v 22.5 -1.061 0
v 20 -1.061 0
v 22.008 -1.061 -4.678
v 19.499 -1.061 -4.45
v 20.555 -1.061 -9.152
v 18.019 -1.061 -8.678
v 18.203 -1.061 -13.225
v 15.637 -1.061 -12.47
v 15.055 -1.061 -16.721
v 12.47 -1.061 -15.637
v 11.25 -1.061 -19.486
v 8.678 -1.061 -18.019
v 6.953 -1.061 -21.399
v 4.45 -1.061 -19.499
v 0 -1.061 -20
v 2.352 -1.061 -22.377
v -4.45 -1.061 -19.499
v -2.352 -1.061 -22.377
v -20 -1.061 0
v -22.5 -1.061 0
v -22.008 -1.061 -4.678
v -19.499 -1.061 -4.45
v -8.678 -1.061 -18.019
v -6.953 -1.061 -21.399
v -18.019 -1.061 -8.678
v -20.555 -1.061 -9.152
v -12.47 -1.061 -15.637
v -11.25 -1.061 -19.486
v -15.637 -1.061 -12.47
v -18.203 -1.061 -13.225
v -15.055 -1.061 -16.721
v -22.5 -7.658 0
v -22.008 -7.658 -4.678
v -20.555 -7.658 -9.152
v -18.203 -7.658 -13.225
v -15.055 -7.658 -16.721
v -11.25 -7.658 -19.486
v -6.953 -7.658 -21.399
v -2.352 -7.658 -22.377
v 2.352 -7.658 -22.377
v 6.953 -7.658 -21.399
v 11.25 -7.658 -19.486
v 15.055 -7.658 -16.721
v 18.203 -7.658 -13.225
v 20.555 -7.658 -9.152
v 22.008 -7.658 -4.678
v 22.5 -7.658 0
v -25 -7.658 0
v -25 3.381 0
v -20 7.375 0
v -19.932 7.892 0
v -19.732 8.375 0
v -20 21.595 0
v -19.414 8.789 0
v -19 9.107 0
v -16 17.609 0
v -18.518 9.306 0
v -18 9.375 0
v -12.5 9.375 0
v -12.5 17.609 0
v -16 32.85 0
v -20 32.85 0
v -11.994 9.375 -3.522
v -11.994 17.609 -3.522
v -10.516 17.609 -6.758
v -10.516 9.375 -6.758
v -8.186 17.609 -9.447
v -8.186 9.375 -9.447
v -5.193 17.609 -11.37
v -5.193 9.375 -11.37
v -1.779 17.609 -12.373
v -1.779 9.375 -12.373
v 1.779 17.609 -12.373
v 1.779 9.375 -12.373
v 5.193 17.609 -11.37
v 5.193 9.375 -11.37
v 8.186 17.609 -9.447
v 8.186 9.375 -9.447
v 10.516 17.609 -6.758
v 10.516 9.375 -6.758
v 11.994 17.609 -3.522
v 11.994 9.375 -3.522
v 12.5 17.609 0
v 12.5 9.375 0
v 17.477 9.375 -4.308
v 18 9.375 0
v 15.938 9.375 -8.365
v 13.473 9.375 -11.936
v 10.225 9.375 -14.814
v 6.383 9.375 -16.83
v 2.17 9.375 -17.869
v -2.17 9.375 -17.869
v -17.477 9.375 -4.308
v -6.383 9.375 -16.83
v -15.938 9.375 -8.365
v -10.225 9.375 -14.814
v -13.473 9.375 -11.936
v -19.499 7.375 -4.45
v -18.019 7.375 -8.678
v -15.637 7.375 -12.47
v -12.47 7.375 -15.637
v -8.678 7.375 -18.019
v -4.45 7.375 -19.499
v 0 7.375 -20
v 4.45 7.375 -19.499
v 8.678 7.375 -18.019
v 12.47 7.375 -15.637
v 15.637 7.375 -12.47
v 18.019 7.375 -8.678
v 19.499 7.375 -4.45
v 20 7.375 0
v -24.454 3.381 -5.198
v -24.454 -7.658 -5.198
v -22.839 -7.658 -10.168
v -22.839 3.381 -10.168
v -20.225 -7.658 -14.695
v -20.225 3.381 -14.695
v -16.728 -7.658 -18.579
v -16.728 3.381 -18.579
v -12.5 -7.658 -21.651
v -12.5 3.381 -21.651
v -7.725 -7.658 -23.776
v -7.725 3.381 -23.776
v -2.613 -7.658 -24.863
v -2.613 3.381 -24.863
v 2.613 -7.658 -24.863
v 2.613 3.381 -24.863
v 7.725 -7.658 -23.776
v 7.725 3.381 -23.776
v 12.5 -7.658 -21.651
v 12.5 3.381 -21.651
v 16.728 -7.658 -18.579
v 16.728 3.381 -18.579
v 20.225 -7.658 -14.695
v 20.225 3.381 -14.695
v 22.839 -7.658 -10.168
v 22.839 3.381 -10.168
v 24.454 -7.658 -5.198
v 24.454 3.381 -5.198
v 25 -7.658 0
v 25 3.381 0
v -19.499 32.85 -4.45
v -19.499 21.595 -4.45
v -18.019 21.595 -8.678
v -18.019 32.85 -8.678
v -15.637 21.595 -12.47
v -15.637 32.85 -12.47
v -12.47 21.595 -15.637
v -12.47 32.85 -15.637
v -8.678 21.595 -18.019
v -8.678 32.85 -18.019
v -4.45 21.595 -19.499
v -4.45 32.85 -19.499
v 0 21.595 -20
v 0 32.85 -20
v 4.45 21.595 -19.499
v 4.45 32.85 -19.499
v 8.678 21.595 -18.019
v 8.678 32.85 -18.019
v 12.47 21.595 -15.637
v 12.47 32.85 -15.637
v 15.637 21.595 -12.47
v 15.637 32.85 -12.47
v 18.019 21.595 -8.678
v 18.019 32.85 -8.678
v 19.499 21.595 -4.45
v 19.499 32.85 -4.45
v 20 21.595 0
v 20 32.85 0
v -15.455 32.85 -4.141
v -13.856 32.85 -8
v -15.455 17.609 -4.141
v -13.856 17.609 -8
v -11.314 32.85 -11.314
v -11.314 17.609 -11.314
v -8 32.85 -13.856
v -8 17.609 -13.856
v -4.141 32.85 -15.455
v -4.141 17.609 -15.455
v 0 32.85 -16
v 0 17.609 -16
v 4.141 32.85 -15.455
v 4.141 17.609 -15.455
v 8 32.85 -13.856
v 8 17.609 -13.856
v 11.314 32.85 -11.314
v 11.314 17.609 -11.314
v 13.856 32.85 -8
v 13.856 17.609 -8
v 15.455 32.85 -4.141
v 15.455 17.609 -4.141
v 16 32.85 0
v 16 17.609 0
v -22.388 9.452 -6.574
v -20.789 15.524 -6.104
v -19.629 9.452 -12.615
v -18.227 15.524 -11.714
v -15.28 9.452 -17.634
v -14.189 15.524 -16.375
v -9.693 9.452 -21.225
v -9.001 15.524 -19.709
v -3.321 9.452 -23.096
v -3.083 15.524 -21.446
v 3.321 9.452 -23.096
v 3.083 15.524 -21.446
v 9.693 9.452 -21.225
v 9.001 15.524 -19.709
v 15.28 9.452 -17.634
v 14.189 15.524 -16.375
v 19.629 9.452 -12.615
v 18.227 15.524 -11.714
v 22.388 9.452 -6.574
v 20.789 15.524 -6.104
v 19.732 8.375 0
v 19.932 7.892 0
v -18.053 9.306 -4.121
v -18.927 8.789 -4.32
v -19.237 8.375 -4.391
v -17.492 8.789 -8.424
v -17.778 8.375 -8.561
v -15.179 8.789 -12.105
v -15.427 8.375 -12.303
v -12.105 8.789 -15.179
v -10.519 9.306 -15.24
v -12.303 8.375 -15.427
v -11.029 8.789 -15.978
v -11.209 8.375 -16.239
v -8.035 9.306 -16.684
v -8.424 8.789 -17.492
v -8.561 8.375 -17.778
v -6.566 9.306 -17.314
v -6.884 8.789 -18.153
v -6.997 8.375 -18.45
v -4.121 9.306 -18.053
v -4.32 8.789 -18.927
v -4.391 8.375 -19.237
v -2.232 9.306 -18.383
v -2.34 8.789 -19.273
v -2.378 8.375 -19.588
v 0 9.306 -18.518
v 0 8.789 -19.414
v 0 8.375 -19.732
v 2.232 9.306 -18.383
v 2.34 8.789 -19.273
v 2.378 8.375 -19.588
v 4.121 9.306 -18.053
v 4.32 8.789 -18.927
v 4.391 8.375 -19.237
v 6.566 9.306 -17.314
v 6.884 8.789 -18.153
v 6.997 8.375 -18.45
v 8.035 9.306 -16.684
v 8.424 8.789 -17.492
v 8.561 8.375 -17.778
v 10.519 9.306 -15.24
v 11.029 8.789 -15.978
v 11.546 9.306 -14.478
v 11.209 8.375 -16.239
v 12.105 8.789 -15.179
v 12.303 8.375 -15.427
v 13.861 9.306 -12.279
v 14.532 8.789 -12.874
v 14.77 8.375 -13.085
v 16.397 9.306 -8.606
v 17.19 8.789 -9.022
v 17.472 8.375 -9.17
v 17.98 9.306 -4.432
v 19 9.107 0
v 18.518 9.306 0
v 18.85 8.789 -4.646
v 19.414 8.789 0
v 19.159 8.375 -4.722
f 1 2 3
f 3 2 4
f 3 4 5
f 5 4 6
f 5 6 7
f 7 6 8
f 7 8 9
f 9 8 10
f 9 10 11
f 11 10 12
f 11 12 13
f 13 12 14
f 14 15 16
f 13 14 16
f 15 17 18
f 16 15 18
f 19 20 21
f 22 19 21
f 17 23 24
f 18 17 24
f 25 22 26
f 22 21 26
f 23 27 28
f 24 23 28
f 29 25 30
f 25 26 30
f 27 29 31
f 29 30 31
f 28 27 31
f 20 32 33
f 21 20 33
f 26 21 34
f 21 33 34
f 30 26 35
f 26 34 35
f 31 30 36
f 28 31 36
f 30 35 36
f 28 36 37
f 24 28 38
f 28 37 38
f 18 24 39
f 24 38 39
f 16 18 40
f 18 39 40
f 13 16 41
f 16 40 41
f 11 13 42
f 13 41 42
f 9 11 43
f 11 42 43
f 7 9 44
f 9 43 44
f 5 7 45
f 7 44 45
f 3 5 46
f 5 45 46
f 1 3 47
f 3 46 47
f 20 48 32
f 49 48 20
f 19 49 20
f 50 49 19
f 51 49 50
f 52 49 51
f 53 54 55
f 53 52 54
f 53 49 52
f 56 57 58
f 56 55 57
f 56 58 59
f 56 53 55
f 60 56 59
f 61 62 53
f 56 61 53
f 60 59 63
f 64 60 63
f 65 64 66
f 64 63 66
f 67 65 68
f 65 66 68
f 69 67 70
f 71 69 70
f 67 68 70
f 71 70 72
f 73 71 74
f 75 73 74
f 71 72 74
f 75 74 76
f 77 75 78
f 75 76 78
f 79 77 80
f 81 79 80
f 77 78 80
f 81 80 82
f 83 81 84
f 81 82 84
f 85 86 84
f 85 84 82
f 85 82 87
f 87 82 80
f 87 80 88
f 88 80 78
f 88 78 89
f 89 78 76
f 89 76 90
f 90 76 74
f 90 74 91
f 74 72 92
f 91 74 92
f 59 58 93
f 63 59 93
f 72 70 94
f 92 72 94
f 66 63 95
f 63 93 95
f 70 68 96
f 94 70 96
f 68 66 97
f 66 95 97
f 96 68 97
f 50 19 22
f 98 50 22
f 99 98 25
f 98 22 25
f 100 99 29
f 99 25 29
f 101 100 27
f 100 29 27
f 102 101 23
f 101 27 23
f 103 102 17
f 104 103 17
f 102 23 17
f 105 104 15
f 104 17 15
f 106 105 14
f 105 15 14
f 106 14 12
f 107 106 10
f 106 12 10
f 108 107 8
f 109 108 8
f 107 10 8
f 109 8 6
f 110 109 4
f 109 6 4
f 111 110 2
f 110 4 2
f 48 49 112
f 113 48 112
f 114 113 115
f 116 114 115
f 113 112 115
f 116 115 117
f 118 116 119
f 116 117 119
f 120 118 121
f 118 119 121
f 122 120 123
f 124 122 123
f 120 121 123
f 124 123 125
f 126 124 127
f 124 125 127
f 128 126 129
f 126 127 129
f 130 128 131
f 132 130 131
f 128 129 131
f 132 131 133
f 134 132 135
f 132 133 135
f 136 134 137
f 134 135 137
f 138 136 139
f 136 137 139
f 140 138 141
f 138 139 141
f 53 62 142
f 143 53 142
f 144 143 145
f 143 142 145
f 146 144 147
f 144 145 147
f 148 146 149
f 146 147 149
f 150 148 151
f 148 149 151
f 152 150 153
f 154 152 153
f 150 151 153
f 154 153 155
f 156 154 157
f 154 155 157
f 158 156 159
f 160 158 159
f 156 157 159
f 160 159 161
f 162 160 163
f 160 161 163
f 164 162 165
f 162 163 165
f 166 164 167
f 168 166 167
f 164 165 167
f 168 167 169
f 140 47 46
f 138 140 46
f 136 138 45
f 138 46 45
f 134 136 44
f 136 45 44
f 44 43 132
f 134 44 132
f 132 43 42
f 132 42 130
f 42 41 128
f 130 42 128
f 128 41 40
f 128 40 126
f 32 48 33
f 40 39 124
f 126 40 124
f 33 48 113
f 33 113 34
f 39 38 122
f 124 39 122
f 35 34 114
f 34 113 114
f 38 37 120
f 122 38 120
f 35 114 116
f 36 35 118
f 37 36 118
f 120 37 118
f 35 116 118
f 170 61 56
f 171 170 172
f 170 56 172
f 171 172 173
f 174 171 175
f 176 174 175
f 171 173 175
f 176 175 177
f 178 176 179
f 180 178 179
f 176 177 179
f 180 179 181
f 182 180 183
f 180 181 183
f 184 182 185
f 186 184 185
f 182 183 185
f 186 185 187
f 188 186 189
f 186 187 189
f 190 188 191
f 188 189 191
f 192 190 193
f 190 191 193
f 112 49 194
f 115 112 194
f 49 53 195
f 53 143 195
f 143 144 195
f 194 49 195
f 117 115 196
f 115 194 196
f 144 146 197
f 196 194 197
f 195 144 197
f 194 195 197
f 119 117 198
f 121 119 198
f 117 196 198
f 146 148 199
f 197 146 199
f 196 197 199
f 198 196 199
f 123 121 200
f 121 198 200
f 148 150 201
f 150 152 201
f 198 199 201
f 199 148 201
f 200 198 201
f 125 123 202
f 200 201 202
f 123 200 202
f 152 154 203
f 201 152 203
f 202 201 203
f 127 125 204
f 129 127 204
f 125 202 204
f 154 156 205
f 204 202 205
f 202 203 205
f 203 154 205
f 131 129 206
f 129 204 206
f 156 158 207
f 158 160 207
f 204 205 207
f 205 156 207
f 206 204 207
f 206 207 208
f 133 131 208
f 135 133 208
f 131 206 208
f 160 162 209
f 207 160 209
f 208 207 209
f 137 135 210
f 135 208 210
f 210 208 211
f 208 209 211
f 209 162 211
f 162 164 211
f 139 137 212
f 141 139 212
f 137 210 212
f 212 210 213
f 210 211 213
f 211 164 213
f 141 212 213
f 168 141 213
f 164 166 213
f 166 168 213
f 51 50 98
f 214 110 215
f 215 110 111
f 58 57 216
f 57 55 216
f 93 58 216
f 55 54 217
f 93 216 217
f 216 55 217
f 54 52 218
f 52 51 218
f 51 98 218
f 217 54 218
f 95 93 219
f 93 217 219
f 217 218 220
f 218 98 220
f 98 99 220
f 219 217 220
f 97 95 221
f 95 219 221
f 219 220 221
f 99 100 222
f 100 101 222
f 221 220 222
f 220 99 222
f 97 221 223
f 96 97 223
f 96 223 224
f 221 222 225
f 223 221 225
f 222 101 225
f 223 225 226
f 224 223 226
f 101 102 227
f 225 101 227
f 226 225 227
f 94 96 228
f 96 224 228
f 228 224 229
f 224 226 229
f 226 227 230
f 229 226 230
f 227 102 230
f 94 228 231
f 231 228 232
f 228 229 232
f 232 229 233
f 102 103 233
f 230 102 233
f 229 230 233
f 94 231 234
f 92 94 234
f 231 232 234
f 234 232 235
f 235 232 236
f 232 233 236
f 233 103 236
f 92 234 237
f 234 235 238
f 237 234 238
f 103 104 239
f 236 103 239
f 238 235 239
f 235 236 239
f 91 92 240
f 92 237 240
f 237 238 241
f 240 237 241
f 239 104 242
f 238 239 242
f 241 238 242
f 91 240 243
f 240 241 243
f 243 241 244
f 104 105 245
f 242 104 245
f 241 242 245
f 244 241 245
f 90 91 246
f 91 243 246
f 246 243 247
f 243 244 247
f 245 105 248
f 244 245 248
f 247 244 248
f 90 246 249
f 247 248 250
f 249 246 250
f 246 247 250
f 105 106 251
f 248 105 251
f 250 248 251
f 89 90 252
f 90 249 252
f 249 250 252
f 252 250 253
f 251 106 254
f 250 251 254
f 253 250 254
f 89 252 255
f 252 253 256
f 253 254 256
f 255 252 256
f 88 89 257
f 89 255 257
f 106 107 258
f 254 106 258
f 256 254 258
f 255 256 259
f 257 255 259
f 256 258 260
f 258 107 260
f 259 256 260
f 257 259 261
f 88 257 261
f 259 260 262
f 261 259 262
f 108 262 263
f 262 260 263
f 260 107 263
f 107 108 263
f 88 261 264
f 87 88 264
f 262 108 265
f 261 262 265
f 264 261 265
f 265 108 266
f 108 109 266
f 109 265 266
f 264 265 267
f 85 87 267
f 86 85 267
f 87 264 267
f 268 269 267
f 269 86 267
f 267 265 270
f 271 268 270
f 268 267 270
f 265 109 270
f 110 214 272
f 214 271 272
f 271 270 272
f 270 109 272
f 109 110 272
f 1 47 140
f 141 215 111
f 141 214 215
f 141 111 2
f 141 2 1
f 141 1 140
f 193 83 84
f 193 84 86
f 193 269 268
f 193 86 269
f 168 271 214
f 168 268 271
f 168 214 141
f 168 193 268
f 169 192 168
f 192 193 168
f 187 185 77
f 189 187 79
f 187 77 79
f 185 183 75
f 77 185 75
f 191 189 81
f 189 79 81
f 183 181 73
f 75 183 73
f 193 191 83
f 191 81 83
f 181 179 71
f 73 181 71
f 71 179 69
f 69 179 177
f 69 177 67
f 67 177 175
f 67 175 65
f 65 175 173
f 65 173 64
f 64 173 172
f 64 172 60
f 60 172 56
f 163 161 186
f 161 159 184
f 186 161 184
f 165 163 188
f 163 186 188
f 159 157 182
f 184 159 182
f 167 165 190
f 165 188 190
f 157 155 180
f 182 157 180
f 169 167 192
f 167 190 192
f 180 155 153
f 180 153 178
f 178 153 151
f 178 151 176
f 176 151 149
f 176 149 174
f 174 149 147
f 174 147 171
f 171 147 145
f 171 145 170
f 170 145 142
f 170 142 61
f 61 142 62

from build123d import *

# Parameters (mm, degrees)
SKETCH3_W          = 71.408394521
SKETCH3_H          = 27.275546844
CUT_EXTRUDE2_DEPTH = 100


with BuildPart() as part:
    # Sketch1 → Revolve1 (revolve)
    with BuildSketch(Plane.XY, mode=Mode.PRIVATE) as revolve1_sk:
        with BuildLine():
            Line((16, 32.849548789), (16, 17.609057399))
            Line((16, 17.609057399), (12.5, 17.609057399))
            Line((12.5, 17.609057399), (12.5, 9.374527929))
            Line((12.5, 9.374527929), (18, 9.374527929))
            ThreePointArc((18, 9.374527929), (19.414213562, 8.788741491), (20, 7.374527929))
            Line((20, 7.374527929), (20, -1.061426296))
            Line((20, -1.061426296), (22.5, -1.061426296))
            Line((22.5, -1.061426296), (22.5, -7.65813411))
            Line((22.5, -7.65813411), (25, -7.65813411))
            Line((25, -7.65813411), (25, 3.380682237))
            Line((25, 3.380682237), (20, 21.59503207))
            Line((20, 21.59503207), (20, 32.849548789))
            Line((20, 32.849548789), (16, 32.849548789))
        make_face()
    revolve(revolve1_sk.sketch.rotate(Axis((0, 89.637369386, 0), (0, -1, 0)), 90), axis=Axis((0, 89.637369386, 0), (0, -1, 0)))  # turned: the seam where the file's is

    # Sketch3 → Cut-Extrude2 (cut, symmetric)
    with BuildSketch(Plane(origin=(0, 0, 0), x_dir=(1, 0, 0), z_dir=(0, 1, 0))):
        with Locations((-0.506442515, -13.637773422)):
            Rectangle(SKETCH3_W, SKETCH3_H)
    extrude(amount=CUT_EXTRUDE2_DEPTH, both=True, mode=Mode.SUBTRACT)


solid = part.part
